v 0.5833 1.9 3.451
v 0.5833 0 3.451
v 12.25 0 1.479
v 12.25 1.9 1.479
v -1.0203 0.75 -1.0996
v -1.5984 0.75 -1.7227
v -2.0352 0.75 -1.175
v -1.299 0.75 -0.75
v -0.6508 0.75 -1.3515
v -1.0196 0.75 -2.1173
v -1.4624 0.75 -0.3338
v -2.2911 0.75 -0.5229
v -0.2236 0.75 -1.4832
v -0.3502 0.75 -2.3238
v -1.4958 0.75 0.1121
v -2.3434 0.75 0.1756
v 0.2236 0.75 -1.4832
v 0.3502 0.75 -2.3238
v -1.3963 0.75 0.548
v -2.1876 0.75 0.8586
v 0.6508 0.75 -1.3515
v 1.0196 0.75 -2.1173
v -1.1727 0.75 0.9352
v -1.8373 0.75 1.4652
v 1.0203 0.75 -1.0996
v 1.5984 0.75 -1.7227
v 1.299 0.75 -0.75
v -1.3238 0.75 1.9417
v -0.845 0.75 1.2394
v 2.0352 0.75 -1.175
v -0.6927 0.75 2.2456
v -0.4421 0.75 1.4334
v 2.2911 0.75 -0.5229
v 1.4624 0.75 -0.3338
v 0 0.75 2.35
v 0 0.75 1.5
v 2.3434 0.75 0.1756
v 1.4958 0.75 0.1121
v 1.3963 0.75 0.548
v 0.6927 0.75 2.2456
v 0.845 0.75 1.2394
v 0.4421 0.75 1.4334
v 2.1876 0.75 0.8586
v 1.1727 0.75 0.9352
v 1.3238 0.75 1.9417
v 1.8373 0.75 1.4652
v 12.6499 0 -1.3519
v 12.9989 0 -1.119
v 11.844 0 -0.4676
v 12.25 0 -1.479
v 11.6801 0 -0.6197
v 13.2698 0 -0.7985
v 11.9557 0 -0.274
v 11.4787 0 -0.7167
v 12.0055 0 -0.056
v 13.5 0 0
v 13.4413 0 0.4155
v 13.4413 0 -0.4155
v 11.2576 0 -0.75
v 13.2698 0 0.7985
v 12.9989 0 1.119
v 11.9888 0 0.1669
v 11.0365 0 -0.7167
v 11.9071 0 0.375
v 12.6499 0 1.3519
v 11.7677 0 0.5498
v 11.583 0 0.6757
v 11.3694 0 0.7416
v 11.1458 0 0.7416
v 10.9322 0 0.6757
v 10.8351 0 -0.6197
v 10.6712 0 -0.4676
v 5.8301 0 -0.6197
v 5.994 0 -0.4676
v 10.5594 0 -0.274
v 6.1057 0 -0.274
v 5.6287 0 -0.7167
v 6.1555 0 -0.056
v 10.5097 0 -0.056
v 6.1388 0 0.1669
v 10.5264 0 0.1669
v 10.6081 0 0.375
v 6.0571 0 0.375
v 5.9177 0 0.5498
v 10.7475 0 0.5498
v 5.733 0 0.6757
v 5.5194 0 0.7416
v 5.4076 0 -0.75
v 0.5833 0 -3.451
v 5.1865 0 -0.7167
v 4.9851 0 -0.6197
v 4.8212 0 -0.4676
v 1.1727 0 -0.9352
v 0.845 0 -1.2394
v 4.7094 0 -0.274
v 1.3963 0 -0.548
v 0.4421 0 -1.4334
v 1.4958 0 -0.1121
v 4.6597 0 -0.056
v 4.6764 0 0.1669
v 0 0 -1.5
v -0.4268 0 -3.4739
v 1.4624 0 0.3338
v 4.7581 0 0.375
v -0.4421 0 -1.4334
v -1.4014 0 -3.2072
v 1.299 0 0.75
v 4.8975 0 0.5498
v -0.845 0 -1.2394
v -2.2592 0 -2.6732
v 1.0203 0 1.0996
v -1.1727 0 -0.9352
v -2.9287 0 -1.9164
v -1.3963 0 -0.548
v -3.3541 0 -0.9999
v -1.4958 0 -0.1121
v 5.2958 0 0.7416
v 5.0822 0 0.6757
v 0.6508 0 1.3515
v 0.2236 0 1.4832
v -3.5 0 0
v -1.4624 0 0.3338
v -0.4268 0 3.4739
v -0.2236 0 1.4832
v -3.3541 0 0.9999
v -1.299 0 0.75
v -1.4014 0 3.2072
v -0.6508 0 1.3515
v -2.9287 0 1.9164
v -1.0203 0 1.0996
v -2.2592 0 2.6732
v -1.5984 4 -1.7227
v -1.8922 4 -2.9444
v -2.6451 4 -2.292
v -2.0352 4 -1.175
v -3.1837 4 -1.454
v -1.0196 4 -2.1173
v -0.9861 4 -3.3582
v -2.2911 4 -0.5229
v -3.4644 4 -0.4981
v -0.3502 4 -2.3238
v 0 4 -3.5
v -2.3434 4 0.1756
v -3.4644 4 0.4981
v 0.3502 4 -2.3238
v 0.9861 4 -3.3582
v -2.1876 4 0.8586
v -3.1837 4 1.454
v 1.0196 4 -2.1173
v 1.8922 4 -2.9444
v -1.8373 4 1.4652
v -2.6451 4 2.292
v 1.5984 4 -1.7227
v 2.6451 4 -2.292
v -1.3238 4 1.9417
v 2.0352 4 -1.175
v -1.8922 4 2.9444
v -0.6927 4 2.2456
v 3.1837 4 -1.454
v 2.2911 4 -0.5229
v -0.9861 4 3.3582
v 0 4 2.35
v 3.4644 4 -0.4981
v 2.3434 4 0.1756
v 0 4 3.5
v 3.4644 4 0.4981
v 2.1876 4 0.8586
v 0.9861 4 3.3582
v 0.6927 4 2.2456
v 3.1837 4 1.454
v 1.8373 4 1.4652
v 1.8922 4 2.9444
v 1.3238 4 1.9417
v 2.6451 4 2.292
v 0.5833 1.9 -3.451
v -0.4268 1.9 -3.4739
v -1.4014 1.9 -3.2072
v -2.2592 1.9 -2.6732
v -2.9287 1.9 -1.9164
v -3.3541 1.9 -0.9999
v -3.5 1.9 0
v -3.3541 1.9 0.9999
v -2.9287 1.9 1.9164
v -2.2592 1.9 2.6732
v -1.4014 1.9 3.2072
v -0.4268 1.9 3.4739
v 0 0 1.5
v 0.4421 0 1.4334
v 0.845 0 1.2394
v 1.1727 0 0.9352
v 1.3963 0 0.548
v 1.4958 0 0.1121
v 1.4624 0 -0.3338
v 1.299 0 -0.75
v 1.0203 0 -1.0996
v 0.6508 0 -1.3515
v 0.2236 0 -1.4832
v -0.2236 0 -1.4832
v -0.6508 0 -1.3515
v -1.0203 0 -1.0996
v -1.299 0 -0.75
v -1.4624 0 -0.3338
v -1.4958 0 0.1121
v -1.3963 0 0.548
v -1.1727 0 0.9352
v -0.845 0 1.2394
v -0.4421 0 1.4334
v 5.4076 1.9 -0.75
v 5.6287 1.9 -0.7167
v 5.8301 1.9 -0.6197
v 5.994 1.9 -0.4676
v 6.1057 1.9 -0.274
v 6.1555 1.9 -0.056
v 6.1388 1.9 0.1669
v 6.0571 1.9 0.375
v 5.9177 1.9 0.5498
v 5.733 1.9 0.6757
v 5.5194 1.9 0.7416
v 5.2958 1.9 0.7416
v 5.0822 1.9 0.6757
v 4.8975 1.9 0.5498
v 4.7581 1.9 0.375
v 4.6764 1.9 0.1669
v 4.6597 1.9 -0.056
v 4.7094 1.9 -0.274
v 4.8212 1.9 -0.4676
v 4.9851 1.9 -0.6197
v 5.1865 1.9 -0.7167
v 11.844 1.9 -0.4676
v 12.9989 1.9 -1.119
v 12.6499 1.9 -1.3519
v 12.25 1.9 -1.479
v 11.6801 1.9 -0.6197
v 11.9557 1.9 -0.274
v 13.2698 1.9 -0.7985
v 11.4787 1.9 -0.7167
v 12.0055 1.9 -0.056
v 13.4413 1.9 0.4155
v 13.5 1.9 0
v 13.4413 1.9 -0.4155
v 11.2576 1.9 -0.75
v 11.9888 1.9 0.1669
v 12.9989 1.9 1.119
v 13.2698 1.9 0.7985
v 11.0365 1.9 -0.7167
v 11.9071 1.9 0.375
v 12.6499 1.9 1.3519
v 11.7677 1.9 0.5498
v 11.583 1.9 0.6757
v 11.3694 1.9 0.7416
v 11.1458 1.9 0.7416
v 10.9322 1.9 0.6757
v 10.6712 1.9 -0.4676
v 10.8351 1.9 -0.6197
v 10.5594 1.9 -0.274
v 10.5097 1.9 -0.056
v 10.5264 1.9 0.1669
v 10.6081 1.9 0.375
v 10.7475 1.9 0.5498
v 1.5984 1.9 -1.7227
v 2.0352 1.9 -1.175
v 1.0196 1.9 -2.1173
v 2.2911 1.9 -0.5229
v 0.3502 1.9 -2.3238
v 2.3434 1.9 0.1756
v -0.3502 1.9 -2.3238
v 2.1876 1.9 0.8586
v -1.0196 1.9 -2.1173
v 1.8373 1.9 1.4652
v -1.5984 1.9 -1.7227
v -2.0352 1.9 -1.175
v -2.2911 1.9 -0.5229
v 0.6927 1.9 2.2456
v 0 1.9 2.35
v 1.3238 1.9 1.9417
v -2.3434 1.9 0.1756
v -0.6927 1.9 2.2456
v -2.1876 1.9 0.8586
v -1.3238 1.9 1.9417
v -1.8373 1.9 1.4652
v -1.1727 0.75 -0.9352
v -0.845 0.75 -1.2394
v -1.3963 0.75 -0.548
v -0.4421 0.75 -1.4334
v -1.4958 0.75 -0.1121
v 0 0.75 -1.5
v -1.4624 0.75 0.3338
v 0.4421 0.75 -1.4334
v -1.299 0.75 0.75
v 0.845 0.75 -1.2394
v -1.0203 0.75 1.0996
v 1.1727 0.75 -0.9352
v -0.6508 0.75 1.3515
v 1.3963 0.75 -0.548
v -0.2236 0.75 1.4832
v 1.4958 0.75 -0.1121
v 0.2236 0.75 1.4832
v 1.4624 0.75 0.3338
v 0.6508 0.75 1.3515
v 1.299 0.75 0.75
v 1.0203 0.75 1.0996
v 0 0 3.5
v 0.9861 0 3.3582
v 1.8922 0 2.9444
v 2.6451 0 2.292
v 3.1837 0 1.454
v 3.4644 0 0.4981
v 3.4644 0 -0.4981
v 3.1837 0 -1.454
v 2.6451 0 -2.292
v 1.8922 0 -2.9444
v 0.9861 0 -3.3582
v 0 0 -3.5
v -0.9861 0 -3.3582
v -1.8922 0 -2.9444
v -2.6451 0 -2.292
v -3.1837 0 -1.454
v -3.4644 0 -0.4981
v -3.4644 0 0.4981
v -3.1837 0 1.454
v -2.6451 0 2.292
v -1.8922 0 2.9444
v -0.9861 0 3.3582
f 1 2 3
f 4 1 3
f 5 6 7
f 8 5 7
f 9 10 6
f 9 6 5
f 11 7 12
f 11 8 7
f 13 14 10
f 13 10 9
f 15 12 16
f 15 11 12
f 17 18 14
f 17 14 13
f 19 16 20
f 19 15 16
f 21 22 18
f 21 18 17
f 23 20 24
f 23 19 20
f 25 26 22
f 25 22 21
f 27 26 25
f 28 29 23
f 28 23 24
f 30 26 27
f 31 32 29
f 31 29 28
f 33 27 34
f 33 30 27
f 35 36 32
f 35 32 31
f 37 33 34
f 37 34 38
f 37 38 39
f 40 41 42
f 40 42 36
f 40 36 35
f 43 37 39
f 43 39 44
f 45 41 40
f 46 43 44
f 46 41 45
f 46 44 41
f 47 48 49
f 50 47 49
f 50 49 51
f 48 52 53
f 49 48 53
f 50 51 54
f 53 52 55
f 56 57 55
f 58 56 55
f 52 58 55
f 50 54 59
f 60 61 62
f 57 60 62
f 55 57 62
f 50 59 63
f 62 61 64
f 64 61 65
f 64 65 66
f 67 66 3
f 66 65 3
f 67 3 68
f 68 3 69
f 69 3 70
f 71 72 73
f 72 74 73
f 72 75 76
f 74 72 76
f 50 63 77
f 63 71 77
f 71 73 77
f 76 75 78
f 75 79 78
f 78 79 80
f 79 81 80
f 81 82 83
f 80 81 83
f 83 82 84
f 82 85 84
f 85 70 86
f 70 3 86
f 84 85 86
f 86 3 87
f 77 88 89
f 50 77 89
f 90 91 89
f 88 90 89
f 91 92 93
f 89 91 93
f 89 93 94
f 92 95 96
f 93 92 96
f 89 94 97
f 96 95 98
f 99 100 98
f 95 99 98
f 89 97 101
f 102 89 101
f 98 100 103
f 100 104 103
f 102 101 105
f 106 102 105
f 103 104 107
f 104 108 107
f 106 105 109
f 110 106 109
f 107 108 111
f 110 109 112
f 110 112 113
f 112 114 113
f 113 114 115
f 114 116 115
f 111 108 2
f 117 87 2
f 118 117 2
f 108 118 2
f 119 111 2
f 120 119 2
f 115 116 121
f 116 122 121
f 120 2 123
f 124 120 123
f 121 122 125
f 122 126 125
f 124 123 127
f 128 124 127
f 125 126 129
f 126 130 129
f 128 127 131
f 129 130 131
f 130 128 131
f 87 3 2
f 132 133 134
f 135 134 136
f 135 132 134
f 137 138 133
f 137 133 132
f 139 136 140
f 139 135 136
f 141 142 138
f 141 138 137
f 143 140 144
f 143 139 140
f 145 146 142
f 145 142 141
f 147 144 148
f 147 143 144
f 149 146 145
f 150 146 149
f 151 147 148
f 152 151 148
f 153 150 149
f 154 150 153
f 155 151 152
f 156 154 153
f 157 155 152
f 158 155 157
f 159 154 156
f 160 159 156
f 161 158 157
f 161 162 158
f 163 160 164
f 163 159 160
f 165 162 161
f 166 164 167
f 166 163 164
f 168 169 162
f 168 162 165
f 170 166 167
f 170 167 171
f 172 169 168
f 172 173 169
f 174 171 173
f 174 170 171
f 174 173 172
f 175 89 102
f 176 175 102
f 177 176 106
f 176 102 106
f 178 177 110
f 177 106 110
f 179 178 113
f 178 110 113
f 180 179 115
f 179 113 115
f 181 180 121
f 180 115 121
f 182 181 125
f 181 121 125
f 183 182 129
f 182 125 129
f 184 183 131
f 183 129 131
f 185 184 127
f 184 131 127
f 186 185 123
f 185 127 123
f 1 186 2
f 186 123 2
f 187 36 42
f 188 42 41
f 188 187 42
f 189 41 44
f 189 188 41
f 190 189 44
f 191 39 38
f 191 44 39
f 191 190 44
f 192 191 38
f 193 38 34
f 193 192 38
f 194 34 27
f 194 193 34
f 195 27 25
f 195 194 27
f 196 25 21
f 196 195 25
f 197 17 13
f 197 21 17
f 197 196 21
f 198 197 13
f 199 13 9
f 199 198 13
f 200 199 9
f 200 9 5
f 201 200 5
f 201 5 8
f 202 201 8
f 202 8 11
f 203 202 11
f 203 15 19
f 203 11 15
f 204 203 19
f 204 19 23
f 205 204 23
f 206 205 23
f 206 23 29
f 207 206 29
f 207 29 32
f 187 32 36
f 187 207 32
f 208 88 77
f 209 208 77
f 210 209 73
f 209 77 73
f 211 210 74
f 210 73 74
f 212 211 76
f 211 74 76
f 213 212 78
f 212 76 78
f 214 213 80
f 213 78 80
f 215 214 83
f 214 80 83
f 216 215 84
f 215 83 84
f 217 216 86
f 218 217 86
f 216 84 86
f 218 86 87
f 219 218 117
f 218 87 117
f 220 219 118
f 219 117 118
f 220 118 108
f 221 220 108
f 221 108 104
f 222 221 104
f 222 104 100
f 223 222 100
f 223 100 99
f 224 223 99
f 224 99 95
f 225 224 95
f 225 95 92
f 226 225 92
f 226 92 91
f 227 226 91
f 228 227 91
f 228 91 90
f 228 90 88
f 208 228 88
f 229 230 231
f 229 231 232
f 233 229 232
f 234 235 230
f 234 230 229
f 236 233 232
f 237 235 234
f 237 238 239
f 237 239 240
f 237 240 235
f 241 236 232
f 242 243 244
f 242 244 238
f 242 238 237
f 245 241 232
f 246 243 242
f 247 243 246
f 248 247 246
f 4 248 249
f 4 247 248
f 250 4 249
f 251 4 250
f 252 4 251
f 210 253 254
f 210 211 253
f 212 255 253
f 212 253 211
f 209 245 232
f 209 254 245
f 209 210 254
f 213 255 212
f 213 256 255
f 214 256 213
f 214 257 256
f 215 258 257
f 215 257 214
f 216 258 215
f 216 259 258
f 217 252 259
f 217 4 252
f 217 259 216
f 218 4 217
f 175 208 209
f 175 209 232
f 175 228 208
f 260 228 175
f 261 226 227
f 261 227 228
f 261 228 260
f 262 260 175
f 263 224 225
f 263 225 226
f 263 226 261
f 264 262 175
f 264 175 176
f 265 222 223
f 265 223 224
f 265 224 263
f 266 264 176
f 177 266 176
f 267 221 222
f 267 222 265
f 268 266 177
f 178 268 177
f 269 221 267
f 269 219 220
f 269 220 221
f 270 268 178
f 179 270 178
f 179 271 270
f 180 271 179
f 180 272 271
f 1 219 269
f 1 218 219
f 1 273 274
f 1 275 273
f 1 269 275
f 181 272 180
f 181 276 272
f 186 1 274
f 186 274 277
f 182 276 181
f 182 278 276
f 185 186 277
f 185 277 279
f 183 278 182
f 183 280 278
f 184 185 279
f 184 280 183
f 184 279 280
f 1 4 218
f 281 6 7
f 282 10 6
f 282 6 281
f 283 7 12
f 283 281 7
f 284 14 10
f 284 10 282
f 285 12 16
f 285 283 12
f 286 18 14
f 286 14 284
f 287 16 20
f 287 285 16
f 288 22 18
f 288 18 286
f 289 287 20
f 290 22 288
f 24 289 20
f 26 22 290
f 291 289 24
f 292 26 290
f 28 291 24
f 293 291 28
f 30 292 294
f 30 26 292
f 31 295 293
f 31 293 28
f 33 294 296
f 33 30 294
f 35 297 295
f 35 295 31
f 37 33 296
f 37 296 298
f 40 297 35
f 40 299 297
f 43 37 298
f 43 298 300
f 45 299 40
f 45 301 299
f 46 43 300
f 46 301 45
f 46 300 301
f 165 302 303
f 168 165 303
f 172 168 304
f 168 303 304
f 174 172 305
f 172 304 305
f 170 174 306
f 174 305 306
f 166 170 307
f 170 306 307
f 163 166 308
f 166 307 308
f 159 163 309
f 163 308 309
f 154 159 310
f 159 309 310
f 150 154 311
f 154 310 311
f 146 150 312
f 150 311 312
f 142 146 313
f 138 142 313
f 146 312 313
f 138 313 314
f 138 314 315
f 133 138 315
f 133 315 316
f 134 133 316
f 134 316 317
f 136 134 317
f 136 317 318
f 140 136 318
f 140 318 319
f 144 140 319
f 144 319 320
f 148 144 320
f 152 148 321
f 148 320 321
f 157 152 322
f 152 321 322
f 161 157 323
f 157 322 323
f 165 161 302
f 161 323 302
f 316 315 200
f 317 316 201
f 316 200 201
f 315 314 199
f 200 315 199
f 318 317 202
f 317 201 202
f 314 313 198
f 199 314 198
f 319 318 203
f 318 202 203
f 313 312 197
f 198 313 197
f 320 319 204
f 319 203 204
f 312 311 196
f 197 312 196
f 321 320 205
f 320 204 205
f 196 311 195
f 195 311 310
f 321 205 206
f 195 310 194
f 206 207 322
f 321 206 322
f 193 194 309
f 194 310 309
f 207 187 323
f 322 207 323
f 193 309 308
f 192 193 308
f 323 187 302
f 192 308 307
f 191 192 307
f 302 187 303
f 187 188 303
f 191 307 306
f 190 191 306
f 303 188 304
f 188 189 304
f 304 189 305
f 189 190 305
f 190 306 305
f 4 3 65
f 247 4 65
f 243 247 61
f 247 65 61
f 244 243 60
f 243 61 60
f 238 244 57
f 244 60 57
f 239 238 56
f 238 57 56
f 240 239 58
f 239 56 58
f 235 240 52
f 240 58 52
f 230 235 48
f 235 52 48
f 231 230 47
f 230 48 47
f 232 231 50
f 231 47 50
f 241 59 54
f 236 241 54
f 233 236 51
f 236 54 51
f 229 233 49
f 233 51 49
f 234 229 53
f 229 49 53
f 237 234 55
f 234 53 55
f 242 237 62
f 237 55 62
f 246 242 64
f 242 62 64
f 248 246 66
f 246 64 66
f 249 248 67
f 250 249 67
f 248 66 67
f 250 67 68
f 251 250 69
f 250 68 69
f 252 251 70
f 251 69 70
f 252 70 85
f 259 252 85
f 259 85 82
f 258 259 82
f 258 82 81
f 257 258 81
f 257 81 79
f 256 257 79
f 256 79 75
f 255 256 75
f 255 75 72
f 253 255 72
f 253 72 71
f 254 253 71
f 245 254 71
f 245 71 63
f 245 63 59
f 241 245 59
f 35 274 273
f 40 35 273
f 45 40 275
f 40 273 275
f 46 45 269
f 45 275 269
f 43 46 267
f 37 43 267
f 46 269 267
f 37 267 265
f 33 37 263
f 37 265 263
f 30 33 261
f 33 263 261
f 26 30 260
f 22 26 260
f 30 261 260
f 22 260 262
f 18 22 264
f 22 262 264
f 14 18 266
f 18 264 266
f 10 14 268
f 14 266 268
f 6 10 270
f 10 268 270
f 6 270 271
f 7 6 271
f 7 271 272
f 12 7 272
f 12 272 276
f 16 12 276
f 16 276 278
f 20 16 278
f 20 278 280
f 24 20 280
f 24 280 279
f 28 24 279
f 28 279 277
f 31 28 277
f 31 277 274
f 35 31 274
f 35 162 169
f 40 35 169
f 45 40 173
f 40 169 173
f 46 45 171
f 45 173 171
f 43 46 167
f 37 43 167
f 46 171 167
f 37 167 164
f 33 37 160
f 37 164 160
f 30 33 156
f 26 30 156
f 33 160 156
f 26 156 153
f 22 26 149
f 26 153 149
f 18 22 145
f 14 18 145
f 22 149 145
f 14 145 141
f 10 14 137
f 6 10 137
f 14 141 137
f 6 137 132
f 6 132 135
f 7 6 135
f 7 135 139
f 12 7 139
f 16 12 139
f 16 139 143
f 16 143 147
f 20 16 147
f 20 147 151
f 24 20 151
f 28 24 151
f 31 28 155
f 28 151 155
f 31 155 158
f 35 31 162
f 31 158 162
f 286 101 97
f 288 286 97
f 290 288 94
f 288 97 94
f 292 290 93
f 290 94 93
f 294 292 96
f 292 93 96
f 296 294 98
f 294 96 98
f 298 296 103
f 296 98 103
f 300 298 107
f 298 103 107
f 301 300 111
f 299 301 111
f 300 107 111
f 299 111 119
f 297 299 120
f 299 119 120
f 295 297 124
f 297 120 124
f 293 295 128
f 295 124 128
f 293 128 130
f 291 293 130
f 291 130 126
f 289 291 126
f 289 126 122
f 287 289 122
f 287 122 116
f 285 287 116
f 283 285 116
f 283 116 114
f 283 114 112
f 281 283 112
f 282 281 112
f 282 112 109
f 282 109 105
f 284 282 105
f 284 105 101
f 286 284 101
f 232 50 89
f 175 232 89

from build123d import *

# Parameters (mm, degrees)
SKETCH1_R           = 3.5
SKETCH1_R_2         = 1.5
BOSS_EXTRUDE1_DEPTH = 4
SKETCH2_R           = 1.5
BOSS_EXTRUDE2_DEPTH = 1.9
SKETCH3_R           = 2.35
CUT_EXTRUDE1_DEPTH  = 3.25
SKETCH5_R           = 0.75
CUT_EXTRUDE2_DEPTH  = 15.508618129


with BuildPart() as part:
    # Sketch1 → Boss-Extrude1 (new body)
    with BuildSketch(Plane(origin=(0, 0, 0), x_dir=(1, 0, 0), z_dir=(0, 1, 0))):
        with Locations(Location((0, 0, 0), (0, 0, 270))):
            Circle(SKETCH1_R)
        with Locations(Location((0, 0, 0), (0, 0, 270))):
            Circle(SKETCH1_R_2, mode=Mode.SUBTRACT)
    extrude(amount=BOSS_EXTRUDE1_DEPTH)


with BuildPart() as body_2:
    # Sketch2 → Boss-Extrude2 (new body)
    with BuildSketch(Plane.XZ):
        with BuildLine():
            Line((0.583333333, 3.45104654), (12.25, 1.479019946))
            ThreePointArc((12.25, 1.479019946), (13.5, 0), (12.25, -1.479019946))
            Line((12.25, -1.479019946), (0.583333333, -3.45104654))
            ThreePointArc((0.583333333, -3.45104654), (-3.5, 0), (0.583333333, 3.45104654))
        make_face()
        with Locations(Location((0, 0, 0), (0, 0, 270))):
            Circle(SKETCH2_R, mode=Mode.SUBTRACT)
    extrude(amount=-BOSS_EXTRUDE2_DEPTH)


with BuildPart() as cut_extrude1_tool:
    # Sketch3 → Cut-Extrude1 (new body)
    with BuildSketch(Plane(origin=(0, 4, 0), x_dir=(1, 0, 0), z_dir=(0, 1, 0))):
        with Locations(Location((0, 0, 0), (0, 0, 270))):
            Circle(SKETCH3_R)
    extrude(amount=-CUT_EXTRUDE1_DEPTH)


with BuildPart() as part_1:
    add(part.part)

    # Cut-Extrude1: cut by cut_extrude1_tool
    add(cut_extrude1_tool.part, mode=Mode.SUBTRACT)


with BuildPart() as body_2_1:
    add(body_2.part)

    # Cut-Extrude1: cut by cut_extrude1_tool
    add(cut_extrude1_tool.part, mode=Mode.SUBTRACT)

    # Sketch5 → Cut-Extrude2 (cut, through all)
    with BuildSketch(Plane.XZ):
        with Locations(Location((11.257592571, 0, 0), (0, 0, 270))):
            Circle(SKETCH5_R)
        with Locations(Location((5.407592571, 0, 0), (0, 0, 270))):
            Circle(SKETCH5_R)
    extrude(amount=-CUT_EXTRUDE2_DEPTH, mode=Mode.SUBTRACT)


solid = Compound([part_1.part, body_2_1.part])
